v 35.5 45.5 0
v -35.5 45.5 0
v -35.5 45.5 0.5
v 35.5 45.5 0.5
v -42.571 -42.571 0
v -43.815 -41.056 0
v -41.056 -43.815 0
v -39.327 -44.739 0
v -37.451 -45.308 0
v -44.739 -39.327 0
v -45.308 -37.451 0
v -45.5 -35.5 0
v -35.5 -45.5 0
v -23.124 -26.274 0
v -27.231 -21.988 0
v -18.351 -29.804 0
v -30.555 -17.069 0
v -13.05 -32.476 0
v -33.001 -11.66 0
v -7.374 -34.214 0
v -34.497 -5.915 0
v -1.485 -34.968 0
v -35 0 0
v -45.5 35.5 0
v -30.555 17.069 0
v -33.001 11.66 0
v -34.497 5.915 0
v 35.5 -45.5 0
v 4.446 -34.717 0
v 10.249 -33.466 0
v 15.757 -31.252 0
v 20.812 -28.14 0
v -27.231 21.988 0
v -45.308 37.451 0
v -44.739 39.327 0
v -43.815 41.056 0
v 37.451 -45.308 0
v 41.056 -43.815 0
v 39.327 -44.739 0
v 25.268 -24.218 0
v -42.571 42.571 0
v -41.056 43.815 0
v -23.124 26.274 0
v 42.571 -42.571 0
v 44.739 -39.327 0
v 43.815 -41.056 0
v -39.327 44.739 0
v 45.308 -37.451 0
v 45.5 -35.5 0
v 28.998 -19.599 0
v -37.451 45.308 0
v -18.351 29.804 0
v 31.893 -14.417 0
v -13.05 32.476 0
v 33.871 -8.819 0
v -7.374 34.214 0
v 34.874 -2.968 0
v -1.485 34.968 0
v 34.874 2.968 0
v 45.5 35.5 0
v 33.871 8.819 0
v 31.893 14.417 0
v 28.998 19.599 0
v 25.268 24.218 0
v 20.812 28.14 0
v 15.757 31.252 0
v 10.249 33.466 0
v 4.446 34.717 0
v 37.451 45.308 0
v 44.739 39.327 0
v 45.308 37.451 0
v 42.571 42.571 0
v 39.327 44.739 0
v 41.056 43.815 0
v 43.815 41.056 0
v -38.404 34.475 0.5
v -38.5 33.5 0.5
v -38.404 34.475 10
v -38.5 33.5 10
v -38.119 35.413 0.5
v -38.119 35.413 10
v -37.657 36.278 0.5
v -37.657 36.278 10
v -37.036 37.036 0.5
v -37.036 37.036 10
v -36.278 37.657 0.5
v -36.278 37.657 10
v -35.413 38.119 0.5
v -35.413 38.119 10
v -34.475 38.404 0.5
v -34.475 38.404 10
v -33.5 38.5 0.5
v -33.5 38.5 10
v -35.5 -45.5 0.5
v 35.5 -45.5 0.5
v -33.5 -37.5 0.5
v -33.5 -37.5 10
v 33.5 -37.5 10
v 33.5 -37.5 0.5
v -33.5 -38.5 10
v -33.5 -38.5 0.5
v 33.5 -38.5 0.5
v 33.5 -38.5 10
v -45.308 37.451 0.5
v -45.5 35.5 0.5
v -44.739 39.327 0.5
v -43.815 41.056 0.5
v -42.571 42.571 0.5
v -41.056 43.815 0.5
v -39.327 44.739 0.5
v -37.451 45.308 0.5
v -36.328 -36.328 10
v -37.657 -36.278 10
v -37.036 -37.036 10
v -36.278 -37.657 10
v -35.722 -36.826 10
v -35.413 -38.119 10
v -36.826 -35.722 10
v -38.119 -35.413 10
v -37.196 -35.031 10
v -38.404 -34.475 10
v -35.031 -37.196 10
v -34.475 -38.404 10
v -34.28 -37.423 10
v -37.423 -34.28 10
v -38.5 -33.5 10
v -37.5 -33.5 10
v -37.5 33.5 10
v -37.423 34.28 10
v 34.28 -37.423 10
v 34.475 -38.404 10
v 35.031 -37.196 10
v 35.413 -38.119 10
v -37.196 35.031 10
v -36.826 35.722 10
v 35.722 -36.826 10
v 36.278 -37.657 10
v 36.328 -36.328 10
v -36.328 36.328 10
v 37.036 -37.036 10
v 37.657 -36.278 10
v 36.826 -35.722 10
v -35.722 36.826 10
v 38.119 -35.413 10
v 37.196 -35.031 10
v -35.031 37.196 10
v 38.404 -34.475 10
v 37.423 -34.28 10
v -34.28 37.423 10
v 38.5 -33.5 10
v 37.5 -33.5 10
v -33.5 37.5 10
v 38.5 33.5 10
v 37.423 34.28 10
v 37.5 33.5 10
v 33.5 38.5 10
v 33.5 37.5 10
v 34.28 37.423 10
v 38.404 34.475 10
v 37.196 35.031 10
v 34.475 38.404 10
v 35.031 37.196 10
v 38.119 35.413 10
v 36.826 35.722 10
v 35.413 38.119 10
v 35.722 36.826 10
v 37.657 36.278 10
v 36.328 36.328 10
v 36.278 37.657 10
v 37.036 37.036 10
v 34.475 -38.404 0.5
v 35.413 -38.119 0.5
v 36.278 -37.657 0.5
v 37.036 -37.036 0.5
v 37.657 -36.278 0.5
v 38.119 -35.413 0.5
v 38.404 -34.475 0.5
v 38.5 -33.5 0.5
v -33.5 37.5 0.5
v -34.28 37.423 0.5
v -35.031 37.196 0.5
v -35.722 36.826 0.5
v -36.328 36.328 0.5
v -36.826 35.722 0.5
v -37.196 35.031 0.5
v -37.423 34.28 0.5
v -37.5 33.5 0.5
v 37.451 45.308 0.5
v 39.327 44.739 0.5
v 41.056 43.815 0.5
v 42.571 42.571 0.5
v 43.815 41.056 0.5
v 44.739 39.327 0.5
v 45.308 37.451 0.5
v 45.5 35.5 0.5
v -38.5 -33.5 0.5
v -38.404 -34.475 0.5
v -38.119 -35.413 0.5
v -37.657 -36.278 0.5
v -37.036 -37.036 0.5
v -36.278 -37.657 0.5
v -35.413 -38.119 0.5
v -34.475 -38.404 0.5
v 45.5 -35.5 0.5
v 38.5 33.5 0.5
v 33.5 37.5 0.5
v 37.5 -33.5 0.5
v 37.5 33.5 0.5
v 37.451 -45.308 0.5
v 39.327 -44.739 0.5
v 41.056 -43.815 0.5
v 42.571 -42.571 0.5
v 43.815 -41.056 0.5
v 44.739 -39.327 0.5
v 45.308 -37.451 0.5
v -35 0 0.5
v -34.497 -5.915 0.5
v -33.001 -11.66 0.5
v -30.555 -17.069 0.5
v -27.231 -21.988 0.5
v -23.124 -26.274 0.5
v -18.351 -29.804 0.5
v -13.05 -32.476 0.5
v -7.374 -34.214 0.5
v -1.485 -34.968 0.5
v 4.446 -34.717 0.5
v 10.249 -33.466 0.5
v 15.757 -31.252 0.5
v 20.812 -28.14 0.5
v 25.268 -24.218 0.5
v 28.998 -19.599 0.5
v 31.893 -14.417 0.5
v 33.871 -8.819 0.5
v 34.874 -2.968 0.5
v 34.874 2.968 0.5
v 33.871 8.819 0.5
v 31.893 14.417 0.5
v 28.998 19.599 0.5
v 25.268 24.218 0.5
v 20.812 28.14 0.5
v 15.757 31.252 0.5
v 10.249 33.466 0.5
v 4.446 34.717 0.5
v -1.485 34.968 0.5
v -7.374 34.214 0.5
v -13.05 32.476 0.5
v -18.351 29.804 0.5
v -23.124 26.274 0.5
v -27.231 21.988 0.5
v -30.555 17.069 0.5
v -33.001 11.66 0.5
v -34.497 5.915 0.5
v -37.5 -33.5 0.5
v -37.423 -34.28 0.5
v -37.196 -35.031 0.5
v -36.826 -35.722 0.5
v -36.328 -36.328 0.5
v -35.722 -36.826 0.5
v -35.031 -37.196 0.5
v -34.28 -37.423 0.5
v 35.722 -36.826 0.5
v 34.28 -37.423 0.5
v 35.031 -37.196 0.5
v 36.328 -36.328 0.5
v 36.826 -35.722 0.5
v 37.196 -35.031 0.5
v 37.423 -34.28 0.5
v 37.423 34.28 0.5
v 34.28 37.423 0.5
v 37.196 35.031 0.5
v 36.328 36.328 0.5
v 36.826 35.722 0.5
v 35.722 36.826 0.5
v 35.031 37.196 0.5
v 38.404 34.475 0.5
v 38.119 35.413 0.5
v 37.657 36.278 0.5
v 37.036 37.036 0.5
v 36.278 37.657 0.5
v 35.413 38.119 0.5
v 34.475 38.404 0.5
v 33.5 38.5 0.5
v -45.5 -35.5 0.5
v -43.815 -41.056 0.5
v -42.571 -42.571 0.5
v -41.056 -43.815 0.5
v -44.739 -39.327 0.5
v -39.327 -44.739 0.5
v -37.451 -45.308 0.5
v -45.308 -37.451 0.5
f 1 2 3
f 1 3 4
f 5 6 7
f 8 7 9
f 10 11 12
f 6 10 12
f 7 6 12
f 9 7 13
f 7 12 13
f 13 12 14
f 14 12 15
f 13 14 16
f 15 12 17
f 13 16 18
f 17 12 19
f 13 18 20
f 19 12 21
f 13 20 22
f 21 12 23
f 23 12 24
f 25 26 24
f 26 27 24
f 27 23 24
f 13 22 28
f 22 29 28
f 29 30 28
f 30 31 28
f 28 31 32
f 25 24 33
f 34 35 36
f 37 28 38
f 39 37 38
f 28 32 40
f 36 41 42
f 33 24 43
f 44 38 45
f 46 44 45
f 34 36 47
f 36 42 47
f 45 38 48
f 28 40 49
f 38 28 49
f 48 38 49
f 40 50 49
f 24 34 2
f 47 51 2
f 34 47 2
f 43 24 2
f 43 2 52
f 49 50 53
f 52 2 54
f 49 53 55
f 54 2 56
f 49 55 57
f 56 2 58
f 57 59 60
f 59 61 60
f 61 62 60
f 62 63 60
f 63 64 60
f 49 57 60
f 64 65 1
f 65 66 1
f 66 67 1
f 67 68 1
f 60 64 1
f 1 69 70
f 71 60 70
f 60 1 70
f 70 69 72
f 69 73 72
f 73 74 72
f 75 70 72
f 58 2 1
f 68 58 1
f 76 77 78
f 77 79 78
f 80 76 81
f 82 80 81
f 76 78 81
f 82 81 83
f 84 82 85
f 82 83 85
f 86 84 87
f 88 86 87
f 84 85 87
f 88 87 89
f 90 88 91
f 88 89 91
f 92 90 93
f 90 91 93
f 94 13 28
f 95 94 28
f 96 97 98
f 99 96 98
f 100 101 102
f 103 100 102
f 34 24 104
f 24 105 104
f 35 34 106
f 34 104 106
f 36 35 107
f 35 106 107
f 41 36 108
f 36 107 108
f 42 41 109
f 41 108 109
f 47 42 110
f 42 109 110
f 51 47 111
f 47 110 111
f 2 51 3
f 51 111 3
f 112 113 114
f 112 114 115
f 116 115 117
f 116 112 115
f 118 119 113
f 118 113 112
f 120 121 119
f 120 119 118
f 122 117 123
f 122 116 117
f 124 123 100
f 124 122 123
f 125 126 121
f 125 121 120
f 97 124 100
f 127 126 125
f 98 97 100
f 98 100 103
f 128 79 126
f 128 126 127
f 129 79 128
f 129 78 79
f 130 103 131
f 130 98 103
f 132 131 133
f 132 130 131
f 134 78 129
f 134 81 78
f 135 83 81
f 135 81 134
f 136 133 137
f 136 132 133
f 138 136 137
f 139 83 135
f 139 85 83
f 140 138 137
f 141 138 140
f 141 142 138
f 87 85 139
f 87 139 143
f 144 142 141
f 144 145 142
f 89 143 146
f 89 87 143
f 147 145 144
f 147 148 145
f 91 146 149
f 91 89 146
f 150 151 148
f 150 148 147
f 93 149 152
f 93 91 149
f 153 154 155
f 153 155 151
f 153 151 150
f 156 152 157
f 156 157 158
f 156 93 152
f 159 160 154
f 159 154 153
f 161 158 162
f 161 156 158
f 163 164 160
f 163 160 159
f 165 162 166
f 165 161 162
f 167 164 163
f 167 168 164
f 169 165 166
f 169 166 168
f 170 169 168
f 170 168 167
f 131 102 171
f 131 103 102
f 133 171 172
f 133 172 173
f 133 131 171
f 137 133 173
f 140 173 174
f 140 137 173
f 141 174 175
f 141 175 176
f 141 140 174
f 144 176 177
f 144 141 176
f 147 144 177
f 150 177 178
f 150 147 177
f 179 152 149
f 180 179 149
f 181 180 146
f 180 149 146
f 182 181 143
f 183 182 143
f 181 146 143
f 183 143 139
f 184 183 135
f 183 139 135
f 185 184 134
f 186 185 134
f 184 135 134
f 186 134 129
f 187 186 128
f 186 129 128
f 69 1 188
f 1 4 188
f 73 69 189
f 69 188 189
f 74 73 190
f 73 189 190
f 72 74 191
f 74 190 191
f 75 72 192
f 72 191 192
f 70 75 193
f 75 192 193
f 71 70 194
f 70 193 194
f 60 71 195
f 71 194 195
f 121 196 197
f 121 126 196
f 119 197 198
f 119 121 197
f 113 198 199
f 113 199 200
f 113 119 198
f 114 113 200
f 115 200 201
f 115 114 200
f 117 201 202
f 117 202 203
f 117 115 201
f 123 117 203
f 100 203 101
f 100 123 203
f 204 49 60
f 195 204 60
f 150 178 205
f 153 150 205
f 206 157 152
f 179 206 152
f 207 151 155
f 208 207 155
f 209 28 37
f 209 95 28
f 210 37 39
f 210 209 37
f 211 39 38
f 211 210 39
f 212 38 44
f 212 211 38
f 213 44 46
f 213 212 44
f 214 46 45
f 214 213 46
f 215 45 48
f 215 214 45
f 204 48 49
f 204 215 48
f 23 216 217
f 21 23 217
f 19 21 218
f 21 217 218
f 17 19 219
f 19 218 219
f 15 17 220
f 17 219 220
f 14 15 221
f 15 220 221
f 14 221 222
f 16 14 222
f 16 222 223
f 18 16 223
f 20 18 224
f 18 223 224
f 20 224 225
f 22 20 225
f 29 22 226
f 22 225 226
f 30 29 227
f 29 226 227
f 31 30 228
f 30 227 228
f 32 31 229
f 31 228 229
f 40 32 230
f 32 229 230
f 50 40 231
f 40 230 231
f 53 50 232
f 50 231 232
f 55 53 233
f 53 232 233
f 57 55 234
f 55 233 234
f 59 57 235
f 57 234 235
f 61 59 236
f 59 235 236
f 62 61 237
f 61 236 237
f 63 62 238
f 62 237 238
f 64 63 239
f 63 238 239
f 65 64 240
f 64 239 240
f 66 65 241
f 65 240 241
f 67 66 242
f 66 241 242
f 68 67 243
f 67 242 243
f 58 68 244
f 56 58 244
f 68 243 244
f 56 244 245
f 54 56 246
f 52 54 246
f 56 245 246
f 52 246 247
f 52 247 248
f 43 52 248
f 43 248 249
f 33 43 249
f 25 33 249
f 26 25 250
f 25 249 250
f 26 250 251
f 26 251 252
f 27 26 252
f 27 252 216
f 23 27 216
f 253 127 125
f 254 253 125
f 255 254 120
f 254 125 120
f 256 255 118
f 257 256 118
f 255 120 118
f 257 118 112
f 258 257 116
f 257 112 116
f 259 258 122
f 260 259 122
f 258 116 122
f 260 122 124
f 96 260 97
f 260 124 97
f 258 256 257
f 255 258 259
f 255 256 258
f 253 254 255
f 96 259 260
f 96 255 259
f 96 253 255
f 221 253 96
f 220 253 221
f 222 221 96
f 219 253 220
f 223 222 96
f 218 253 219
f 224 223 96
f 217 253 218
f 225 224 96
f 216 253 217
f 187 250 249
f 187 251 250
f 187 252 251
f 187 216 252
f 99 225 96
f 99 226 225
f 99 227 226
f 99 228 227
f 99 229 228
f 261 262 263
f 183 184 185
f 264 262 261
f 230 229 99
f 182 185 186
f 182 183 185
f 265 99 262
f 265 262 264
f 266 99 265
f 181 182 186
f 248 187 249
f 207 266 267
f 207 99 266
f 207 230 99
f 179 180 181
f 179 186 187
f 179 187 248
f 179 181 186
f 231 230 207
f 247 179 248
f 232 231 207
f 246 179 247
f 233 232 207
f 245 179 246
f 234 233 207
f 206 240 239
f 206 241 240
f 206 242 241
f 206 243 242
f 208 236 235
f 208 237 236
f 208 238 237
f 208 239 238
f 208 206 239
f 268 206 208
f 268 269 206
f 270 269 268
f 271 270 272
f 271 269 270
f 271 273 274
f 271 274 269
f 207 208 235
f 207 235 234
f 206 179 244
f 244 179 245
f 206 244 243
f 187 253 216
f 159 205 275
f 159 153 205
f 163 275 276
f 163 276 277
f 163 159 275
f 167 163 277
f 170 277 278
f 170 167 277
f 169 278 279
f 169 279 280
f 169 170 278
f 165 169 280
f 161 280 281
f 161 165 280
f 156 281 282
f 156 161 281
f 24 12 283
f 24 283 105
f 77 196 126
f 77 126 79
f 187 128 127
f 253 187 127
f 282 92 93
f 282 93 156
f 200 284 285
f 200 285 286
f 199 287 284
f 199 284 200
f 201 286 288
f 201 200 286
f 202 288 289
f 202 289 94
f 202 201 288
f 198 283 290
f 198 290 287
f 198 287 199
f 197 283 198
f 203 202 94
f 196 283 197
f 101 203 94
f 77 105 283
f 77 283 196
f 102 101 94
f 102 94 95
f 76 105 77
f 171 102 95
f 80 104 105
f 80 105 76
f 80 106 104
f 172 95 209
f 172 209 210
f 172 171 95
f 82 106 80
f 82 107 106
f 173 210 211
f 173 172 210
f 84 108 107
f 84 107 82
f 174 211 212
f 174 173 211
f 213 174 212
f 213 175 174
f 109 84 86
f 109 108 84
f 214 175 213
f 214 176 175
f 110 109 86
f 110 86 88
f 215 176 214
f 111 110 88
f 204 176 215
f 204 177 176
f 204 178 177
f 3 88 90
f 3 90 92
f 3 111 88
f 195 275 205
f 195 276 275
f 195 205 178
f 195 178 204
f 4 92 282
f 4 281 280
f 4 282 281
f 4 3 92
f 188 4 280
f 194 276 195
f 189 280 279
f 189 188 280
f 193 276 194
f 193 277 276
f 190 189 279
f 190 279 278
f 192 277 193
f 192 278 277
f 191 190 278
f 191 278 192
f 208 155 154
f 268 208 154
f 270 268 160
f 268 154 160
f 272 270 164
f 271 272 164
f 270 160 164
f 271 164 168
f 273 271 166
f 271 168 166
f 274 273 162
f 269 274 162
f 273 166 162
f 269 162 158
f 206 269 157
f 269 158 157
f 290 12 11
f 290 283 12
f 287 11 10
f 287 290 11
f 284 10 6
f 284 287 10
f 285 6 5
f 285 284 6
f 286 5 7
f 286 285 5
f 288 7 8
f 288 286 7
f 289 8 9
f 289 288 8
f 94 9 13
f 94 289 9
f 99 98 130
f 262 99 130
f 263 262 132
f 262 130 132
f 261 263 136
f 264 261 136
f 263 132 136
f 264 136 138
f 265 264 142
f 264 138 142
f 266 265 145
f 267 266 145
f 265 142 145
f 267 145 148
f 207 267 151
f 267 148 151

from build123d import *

# Parameters (mm, degrees)
SKETCH1_W           = 91
SKETCH1_H           = 91
BOSS_EXTRUDE1_DEPTH = 0.5
SKETCH2_W           = 77
SKETCH2_H           = 77
BOSS_EXTRUDE2_DEPTH = 10
FILLET1_R           = 5
CUT_EXTRUDE1_DEPTH  = 66.119121616
FILLET2_R           = 10
BOSS_EXTRUDE3_START = 0.5
SKETCH7_R           = 35
BOSS_EXTRUDE3_DEPTH = 0.5


with BuildPart() as part:
    # Sketch1 → Boss-Extrude1 (new body)
    with BuildSketch(Plane.XY):
        Rectangle(SKETCH1_W, SKETCH1_H)
    extrude(amount=BOSS_EXTRUDE1_DEPTH)

    # Sketch2 → Boss-Extrude2 (add)
    with BuildSketch(Plane.XY):
        Rectangle(SKETCH2_W, SKETCH2_H)
    extrude(amount=BOSS_EXTRUDE2_DEPTH)

    # Fillet1
    fillet1_edges = [part.edges().sort_by_distance(p)[0] for p in [
        (38.5, -38.5, 5.25),
        (38.5, 38.5, 5.25),
        (-38.5, 38.5, 5.25),
        (-38.5, -38.5, 5.25),
    ]]
    fillet(fillet1_edges, radius=FILLET1_R)

    # Sketch4 → Cut-Extrude1 (cut, through all)
    with BuildSketch(Plane.XY.offset(10)):
        with BuildLine():
            Line((-33.5, -37.5), (33.5, -37.5))
            ThreePointArc((33.5, -37.5), (36.328427125, -36.328427125), (37.5, -33.5))
            Line((37.5, -33.5), (37.5, 33.5))
            ThreePointArc((37.5, 33.5), (36.328427125, 36.328427125), (33.5, 37.5))
            Line((33.5, 37.5), (-33.5, 37.5))
            ThreePointArc((-33.5, 37.5), (-36.328427125, 36.328427125), (-37.5, 33.5))
            Line((-37.5, 33.5), (-37.5, -33.5))
            ThreePointArc((-37.5, -33.5), (-36.328427125, -36.328427125), (-33.5, -37.5))
        make_face()
    extrude(amount=-CUT_EXTRUDE1_DEPTH, mode=Mode.SUBTRACT)

    # Fillet2
    fillet2_edges = [part.edges().sort_by_distance(p)[0] for p in [
        (45.5, -45.5, 0.25),
        (-45.5, -45.5, 0.25),
        (-45.5, 45.5, 0.25),
        (45.5, 45.5, 0.25),
    ]]
    fillet(fillet2_edges, radius=FILLET2_R)

    # Sketch7 → Boss-Extrude3 (add)
    with BuildSketch(Plane.XY.offset(BOSS_EXTRUDE3_START)):
        with BuildLine():
            Line((-33.5, -37.5), (33.5, -37.5))
            ThreePointArc((33.5, -37.5), (36.328427125, -36.328427125), (37.5, -33.5))
            Line((37.5, -33.5), (37.5, 33.5))
            ThreePointArc((37.5, 33.5), (36.328427125, 36.328427125), (33.5, 37.5))
            Line((33.5, 37.5), (-33.5, 37.5))
            ThreePointArc((-33.5, 37.5), (-36.328427125, 36.328427125), (-37.5, 33.5))
            Line((-37.5, 33.5), (-37.5, -33.5))
            ThreePointArc((-37.5, -33.5), (-36.328427125, -36.328427125), (-33.5, -37.5))
        make_face()
        with Locations(Location((0, 0, 0), (0, 0, 180))):
            Circle(SKETCH7_R, mode=Mode.SUBTRACT)
    extrude(amount=-BOSS_EXTRUDE3_DEPTH)


solid = part.part
